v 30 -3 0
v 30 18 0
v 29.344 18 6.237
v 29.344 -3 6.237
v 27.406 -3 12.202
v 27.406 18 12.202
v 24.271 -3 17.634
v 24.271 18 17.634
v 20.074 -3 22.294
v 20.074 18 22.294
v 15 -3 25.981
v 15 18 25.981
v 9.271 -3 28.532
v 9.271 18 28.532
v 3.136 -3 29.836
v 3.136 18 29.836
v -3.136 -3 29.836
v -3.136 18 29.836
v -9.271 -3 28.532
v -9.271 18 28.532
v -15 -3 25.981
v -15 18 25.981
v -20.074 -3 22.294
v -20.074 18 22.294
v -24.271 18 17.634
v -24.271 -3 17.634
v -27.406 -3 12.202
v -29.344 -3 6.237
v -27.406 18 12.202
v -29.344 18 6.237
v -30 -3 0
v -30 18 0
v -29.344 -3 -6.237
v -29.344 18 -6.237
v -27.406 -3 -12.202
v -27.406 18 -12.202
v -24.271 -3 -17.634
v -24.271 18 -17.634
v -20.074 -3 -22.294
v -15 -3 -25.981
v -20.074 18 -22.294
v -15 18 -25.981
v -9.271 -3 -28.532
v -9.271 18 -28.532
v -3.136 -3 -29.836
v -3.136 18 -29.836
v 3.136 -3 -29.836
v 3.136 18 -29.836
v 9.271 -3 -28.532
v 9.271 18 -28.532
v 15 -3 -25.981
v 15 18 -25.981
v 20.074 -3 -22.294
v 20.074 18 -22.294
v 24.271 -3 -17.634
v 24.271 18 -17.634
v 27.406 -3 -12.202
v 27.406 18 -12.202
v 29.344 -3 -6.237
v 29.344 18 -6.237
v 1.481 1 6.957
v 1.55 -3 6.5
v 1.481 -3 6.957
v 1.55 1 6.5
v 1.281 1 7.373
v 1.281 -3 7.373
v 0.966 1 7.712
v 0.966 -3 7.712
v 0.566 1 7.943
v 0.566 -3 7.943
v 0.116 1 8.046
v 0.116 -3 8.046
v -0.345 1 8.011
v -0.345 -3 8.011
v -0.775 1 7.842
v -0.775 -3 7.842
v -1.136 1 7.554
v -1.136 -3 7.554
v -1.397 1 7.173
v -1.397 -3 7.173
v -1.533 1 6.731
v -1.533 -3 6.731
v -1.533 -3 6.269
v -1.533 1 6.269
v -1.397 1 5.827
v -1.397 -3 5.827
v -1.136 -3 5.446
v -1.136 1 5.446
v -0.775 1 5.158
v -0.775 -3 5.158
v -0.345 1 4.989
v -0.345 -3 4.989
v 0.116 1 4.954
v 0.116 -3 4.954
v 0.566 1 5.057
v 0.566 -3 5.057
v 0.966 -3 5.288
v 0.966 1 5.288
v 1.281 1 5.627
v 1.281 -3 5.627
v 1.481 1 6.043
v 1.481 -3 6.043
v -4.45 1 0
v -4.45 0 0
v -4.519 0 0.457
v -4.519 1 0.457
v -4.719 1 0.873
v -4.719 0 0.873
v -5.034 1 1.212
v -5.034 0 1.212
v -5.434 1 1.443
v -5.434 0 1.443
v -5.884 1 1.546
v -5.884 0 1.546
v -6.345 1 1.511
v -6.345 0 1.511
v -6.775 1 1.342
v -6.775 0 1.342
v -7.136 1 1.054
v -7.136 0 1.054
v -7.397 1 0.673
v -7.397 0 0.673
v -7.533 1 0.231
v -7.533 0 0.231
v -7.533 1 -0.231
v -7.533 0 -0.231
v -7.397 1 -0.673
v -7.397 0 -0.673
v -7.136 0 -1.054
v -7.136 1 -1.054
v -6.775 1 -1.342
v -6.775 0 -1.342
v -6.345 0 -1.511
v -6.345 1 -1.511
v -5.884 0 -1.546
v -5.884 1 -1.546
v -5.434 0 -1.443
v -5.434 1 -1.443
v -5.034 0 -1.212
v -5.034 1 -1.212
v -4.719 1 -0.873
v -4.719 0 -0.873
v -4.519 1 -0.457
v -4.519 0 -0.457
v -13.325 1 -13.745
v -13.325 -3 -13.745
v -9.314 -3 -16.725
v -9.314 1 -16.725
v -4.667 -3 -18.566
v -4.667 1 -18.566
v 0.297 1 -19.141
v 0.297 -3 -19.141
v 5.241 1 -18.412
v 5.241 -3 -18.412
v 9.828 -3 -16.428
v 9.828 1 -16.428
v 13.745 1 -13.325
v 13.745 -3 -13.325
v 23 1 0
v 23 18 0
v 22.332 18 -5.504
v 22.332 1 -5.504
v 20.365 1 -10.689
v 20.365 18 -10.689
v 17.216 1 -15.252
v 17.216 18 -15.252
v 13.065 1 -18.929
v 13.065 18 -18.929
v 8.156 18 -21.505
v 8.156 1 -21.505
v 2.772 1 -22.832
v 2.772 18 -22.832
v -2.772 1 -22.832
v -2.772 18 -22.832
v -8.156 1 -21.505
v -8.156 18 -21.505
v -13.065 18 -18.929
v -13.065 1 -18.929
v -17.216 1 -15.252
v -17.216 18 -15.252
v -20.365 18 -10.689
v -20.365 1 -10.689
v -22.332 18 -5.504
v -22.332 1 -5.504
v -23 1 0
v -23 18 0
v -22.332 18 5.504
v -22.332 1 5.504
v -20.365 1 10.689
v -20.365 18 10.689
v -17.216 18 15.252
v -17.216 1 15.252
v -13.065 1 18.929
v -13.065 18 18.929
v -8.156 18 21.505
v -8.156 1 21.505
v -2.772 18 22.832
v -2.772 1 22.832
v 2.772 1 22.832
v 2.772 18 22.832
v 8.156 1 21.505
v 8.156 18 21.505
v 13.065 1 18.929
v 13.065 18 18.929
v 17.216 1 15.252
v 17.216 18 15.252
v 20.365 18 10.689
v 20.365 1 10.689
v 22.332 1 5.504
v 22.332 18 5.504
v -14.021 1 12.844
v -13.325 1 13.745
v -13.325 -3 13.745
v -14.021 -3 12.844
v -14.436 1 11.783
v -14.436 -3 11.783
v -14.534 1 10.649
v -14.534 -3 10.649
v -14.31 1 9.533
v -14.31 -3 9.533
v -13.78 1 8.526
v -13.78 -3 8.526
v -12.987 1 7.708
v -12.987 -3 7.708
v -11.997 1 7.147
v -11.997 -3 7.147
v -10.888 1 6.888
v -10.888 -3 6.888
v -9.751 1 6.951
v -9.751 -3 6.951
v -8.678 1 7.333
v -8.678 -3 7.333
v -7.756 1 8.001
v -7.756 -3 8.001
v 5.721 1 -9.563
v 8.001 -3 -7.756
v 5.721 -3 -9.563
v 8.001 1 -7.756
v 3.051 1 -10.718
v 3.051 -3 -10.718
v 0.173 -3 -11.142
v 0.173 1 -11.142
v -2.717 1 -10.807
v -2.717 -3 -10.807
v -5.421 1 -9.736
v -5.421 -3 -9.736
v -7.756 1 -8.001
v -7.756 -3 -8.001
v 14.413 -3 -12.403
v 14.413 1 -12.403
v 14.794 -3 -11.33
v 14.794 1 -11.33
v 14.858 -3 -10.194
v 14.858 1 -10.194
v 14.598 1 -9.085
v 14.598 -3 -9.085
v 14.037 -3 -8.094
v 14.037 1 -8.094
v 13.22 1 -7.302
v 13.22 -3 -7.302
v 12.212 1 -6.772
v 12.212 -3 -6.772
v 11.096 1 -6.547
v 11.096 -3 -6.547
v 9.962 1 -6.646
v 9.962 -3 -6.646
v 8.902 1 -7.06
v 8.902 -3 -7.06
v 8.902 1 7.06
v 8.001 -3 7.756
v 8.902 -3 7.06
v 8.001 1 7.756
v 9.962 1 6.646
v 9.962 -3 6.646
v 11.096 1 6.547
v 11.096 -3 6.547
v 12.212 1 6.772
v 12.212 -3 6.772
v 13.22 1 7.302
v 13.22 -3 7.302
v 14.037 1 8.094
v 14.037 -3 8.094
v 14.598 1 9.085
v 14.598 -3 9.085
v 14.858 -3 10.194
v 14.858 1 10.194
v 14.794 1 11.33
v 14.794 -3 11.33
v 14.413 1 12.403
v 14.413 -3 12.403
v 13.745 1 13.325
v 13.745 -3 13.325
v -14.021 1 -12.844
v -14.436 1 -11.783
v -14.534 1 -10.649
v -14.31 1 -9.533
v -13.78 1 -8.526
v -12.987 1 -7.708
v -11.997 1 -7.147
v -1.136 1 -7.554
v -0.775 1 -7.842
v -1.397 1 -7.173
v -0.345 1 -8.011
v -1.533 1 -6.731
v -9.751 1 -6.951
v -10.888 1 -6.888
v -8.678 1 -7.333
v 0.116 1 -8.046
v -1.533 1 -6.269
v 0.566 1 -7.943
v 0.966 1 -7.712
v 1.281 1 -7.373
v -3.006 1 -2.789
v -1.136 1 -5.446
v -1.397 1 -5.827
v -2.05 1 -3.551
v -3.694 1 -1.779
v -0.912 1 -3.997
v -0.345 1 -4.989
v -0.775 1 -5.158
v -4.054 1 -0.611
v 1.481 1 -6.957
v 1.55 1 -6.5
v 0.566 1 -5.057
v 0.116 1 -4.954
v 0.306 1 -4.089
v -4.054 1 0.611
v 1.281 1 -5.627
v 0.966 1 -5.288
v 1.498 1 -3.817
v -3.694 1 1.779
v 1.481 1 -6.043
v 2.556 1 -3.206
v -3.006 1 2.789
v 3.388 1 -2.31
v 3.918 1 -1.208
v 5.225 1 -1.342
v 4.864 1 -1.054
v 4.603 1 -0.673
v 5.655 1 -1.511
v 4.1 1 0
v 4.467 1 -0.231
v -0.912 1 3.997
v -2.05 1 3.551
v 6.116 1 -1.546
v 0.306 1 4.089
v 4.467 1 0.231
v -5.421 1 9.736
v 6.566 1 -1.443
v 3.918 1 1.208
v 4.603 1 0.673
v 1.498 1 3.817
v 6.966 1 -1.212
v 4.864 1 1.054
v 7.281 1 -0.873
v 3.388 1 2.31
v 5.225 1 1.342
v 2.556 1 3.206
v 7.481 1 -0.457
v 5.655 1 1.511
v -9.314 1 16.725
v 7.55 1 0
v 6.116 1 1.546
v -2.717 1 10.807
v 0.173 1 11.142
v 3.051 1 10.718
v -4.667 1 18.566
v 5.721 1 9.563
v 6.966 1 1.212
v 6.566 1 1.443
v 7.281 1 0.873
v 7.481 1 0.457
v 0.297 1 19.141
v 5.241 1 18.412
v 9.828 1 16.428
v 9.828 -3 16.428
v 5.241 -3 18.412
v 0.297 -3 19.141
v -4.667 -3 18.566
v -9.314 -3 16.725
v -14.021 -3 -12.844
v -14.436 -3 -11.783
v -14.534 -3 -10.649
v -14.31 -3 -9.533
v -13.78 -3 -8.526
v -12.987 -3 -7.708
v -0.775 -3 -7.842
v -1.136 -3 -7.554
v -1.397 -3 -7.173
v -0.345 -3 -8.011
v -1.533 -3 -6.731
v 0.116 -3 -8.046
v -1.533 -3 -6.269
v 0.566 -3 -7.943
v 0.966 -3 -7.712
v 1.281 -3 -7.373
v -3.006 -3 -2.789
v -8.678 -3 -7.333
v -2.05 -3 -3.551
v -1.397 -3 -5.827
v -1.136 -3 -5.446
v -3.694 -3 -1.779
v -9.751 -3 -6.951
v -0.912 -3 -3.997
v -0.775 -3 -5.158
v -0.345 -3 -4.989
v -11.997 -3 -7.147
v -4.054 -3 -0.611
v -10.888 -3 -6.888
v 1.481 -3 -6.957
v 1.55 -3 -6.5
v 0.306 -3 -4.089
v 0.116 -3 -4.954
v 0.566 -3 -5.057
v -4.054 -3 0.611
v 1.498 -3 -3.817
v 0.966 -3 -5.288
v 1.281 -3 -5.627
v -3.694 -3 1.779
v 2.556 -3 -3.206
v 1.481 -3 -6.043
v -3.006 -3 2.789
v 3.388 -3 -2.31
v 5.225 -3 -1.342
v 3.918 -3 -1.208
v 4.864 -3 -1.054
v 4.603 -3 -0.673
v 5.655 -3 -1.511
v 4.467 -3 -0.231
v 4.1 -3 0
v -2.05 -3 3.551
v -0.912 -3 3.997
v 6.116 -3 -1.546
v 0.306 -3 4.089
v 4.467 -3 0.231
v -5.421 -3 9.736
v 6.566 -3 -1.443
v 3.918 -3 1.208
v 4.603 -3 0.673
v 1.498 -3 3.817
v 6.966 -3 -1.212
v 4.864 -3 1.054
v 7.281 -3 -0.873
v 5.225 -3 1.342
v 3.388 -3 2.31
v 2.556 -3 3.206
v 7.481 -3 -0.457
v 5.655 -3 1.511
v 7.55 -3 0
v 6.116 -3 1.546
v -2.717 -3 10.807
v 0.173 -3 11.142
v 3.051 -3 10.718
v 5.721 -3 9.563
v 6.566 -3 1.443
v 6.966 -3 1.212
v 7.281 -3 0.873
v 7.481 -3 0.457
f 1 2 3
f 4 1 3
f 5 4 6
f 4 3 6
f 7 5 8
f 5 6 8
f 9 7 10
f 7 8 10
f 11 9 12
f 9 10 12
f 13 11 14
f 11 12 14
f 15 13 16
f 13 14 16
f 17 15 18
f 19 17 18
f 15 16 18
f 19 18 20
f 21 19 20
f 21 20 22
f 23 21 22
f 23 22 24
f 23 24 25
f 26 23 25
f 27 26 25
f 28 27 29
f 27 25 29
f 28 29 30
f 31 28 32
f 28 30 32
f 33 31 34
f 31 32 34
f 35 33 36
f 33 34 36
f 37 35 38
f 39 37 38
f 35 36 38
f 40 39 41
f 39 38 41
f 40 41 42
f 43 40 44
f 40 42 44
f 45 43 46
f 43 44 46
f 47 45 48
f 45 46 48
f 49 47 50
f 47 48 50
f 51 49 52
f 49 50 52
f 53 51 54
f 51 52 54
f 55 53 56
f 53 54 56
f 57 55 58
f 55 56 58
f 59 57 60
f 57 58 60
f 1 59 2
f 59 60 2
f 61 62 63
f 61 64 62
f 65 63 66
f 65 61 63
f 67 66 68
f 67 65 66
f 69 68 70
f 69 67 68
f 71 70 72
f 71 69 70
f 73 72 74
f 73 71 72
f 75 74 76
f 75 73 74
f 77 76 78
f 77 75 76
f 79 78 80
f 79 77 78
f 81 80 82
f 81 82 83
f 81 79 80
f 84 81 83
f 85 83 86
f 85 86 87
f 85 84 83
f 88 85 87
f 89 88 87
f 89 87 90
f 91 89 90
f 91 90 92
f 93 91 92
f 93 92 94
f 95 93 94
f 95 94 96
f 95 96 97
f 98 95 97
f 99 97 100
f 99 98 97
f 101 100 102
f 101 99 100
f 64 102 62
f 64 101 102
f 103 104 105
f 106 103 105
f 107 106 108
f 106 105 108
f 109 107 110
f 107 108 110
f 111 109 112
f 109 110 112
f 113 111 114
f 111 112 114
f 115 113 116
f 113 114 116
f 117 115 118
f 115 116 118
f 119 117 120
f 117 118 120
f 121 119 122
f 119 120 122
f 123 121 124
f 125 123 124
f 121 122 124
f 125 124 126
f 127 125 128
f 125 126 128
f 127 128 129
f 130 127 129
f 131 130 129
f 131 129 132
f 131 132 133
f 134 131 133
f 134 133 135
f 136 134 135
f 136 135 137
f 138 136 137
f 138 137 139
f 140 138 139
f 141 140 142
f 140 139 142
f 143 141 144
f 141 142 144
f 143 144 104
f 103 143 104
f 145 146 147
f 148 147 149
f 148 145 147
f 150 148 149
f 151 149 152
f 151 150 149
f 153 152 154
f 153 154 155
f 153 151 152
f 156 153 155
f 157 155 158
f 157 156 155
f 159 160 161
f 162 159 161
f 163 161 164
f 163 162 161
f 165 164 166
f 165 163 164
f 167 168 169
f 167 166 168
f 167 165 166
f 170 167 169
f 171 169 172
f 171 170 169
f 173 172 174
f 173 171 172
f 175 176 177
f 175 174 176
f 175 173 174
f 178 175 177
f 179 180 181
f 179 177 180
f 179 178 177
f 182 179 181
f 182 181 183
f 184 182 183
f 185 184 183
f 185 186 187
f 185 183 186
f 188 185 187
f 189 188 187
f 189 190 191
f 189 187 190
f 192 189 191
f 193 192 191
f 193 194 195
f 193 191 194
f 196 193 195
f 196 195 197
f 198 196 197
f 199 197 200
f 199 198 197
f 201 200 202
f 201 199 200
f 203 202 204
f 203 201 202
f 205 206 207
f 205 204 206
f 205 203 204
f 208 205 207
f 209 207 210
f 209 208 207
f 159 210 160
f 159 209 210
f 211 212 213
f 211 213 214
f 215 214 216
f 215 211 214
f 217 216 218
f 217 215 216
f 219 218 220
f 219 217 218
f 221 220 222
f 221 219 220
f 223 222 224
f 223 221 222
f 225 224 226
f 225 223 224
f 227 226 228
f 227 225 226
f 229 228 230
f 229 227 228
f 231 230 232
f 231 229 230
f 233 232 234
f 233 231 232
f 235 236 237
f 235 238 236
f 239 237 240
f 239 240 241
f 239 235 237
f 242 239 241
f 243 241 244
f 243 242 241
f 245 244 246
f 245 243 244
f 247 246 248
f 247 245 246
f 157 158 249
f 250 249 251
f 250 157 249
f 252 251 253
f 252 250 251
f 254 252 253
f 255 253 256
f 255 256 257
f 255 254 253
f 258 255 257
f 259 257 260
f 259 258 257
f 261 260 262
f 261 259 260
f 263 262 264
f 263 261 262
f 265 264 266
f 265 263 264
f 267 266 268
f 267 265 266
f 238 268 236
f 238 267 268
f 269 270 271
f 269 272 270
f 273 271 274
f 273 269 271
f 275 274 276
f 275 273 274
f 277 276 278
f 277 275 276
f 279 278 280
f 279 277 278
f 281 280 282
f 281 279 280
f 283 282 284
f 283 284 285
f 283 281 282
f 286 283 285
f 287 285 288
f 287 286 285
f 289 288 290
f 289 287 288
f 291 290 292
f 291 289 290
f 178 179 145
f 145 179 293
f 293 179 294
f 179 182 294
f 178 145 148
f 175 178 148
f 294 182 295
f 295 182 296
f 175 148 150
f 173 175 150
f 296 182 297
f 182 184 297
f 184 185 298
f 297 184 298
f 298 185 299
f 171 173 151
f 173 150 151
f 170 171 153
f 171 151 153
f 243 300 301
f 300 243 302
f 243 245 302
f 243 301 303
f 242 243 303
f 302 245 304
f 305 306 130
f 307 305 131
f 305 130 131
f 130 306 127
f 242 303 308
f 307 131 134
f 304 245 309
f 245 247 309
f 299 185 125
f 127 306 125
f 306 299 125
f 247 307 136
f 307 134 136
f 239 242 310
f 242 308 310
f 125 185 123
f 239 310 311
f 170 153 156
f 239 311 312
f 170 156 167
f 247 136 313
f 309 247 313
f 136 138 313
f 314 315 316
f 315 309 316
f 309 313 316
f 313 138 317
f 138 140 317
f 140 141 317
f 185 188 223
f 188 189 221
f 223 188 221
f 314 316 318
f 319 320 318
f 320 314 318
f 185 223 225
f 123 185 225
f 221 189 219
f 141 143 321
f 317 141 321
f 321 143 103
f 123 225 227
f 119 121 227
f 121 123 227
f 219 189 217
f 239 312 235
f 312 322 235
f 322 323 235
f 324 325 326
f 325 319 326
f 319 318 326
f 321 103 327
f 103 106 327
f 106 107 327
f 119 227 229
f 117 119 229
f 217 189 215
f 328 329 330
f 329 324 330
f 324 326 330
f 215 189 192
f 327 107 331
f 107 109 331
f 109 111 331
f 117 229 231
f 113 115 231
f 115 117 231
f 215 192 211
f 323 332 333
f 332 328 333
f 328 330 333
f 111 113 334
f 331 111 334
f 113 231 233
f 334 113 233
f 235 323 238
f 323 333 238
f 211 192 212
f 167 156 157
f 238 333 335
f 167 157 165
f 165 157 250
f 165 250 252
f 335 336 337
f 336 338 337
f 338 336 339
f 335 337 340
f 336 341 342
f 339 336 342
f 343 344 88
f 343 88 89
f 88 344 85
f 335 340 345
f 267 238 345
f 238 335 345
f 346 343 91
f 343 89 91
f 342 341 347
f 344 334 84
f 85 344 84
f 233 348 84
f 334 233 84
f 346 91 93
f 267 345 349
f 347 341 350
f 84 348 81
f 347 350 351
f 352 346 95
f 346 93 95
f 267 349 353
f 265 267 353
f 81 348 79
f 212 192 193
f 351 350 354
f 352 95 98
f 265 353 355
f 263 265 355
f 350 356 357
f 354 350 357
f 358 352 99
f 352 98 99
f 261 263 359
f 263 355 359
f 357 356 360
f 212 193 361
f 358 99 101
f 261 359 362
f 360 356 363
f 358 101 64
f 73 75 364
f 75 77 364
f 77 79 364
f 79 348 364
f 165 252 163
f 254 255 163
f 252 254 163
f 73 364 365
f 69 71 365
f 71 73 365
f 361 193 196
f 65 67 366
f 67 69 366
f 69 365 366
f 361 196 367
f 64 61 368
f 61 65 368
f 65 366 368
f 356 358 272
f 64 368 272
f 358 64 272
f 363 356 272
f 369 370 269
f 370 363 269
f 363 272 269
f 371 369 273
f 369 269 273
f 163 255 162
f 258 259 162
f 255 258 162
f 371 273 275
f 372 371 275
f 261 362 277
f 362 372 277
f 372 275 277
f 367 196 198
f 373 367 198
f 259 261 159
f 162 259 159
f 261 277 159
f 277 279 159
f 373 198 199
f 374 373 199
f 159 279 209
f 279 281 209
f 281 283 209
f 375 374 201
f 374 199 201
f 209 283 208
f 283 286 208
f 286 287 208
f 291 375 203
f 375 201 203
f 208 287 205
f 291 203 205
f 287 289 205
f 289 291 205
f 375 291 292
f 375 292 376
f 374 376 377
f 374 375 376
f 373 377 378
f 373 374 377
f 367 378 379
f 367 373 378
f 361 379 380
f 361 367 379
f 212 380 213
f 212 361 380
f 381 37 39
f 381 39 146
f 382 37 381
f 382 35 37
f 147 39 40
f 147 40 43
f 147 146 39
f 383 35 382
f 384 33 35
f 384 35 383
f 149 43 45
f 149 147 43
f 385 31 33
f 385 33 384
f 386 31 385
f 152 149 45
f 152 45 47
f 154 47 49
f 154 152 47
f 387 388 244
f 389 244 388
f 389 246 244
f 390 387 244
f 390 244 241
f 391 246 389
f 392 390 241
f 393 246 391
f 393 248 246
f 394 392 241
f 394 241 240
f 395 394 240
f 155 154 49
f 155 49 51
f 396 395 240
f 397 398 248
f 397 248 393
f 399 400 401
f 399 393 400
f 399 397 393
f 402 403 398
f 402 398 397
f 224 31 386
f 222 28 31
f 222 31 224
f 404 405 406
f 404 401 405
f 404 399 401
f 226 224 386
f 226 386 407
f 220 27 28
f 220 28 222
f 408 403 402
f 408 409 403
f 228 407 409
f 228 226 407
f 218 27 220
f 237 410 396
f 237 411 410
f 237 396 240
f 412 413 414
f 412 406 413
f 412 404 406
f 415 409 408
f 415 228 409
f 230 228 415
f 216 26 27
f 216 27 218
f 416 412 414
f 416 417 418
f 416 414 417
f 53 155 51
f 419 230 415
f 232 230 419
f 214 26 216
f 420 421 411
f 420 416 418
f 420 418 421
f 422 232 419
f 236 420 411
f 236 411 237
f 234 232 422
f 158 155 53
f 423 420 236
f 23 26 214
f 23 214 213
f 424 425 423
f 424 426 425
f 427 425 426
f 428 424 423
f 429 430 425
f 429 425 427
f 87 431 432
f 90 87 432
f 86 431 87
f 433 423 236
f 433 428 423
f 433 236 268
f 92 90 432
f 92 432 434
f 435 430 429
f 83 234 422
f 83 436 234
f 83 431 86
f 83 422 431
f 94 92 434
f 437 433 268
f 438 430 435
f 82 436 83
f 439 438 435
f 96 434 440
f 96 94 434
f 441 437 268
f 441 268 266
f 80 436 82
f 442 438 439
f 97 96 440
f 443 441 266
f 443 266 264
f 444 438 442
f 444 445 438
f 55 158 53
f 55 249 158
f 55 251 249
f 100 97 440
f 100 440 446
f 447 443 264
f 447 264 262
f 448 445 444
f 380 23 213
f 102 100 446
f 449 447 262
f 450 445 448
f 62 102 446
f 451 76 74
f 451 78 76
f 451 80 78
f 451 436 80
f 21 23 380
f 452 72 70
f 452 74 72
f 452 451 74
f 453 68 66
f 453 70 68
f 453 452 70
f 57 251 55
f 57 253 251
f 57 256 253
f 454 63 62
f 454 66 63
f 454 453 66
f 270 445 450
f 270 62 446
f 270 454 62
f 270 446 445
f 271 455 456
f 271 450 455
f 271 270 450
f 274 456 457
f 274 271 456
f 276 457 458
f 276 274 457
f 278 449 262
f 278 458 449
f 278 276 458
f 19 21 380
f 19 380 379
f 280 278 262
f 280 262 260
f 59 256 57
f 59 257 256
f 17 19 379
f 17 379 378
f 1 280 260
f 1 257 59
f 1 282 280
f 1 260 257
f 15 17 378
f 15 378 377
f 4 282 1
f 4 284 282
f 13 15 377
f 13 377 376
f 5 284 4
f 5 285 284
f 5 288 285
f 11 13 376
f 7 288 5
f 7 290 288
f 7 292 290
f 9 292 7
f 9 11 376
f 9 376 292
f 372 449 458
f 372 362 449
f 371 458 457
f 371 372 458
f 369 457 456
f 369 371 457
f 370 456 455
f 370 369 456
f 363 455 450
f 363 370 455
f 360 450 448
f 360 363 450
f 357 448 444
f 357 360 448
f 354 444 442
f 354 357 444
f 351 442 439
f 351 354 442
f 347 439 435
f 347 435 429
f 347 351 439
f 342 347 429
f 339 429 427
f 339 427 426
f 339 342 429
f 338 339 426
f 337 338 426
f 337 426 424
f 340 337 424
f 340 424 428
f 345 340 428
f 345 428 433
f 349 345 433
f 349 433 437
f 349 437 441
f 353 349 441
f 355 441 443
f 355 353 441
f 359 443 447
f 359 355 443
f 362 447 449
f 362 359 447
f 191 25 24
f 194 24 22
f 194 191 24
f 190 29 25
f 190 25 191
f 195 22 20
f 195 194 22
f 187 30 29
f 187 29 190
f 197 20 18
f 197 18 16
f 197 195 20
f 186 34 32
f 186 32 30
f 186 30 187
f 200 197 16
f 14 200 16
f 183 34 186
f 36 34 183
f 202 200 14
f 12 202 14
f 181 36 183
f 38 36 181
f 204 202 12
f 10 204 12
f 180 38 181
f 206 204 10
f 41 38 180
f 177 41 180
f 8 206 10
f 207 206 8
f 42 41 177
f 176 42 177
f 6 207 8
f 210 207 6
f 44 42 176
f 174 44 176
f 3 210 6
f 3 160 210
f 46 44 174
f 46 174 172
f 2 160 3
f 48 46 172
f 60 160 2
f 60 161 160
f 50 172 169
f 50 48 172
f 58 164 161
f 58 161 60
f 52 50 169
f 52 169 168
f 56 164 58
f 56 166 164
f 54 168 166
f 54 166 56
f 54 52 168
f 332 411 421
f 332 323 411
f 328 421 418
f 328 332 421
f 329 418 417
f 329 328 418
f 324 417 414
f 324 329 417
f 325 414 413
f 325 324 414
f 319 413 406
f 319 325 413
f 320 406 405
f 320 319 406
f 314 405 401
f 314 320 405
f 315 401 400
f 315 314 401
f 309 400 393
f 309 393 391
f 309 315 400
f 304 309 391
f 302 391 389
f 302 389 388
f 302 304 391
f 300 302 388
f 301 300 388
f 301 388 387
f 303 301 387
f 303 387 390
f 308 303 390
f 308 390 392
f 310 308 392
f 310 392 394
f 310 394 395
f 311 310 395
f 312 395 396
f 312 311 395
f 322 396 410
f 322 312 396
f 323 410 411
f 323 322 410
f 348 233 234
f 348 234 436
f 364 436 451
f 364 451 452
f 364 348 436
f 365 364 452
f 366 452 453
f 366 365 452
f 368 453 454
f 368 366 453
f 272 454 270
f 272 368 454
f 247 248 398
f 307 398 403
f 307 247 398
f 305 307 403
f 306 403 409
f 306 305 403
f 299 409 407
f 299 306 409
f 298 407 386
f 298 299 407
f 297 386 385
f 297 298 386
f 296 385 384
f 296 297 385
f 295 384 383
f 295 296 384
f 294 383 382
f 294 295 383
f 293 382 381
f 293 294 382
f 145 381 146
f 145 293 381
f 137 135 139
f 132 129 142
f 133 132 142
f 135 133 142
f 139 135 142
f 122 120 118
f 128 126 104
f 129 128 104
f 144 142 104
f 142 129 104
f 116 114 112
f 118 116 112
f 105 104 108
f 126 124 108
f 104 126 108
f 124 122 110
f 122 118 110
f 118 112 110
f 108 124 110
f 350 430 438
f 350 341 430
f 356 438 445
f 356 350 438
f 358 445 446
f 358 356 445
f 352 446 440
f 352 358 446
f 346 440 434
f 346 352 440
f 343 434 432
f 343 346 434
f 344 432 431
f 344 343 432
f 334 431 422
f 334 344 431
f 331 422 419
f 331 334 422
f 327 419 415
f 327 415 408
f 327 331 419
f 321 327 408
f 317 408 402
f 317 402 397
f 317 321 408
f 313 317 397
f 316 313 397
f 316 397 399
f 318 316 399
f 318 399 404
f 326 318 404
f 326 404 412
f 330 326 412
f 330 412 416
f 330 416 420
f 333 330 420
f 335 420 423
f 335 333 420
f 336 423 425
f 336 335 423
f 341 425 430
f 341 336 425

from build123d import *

# Parameters (mm, degrees)
SKETCH_1_R          = 30
SKETCH_1_R_2        = 23
EXTRUDE_1_DEPTH     = 21
SKETCH_2_R          = 23
SKETCH_2_R_2        = 4.1
SKETCH_2_R_3        = 1.55
EXTRUDE_2_DEPTH     = 1
SKETCH_3_R          = 30
SKETCH_3_R_2        = 1.55
SKETCH_3_R_3        = 4.1
EXTRUDE_3_DEPTH     = 3
SKETCH_4_R          = 30
CUT_EXTRUDE_1_DEPTH = 3


with BuildPart() as part:
    # 草图1 → 凸台-拉伸1 (new body)
    with BuildSketch(Plane(origin=(0, 0, 0), x_dir=(1, 0, 0), z_dir=(0, 1, 0))):
        Circle(SKETCH_1_R)
        Circle(SKETCH_1_R_2, mode=Mode.SUBTRACT)
    extrude(amount=EXTRUDE_1_DEPTH)

    # 草图2 → 凸台-拉伸2 (add)
    with BuildSketch(Plane.XZ):
        Circle(SKETCH_2_R)
        Circle(SKETCH_2_R_2, mode=Mode.SUBTRACT)
        with Locations((6, 0)):
            Circle(SKETCH_2_R_3, mode=Mode.SUBTRACT)
        with Locations((-6, 0)):
            Circle(SKETCH_2_R_3, mode=Mode.SUBTRACT)
        with Locations((0, 6.5)):
            Circle(SKETCH_2_R_3, mode=Mode.SUBTRACT)
        with Locations((0, -6.5)):
            Circle(SKETCH_2_R_3, mode=Mode.SUBTRACT)
        with BuildLine():
            ThreePointArc((13.744660155, 13.324975875), (0.2967616, 19.141123201), (-13.324975875, 13.744660155))
            ThreePointArc((-13.324975875, 13.744660155), (-13.412668503, 8.088485652), (-7.756494001, 8.000793024))
            ThreePointArc((-7.756494001, 8.000793024), (0.172745496, 11.142084508), (8.000793024, 7.756494001))
            ThreePointArc((8.000793024, 7.756494001), (13.656967527, 7.668801373), (13.744660155, 13.324975875))
        make_face(mode=Mode.SUBTRACT)
        with BuildLine():
            ThreePointArc((13.744660155, -13.324975875), (0.2967616, -19.141123201), (-13.324975875, -13.744660155))
            ThreePointArc((-13.324975875, -13.744660155), (-13.412668503, -8.088485652), (-7.756494001, -8.000793024))
            ThreePointArc((-7.756494001, -8.000793024), (0.172745496, -11.142084508), (8.000793024, -7.756494001))
            ThreePointArc((8.000793024, -7.756494001), (13.656967527, -7.668801373), (13.744660155, -13.324975875))
        make_face(mode=Mode.SUBTRACT)
    extrude(amount=-EXTRUDE_2_DEPTH)

    # 草图3 → 凸台-拉伸3 (add)
    with BuildSketch(Plane.XZ):
        Circle(SKETCH_3_R)
        with Locations((0, -6.5)):
            Circle(SKETCH_3_R_2, mode=Mode.SUBTRACT)
        with Locations((6, 0)):
            Circle(SKETCH_3_R_2, mode=Mode.SUBTRACT)
        Circle(SKETCH_3_R_3, mode=Mode.SUBTRACT)
        with Locations((0, 6.5)):
            Circle(SKETCH_3_R_2, mode=Mode.SUBTRACT)
        with BuildLine():
            ThreePointArc((-7.756494001, -8.000793024), (-13.412668503, -8.088485652), (-13.324975875, -13.744660155))
            ThreePointArc((-13.324975875, -13.744660155), (0.2967616, -19.141123201), (13.744660155, -13.324975875))
            ThreePointArc((13.744660155, -13.324975875), (13.656967527, -7.668801373), (8.000793024, -7.756494001))
            ThreePointArc((8.000793024, -7.756494001), (0.172745496, -11.142084508), (-7.756494001, -8.000793024))
        make_face(mode=Mode.SUBTRACT)
        with BuildLine():
            ThreePointArc((8.000793024, 7.756494001), (13.656967527, 7.668801373), (13.744660155, 13.324975875))
            ThreePointArc((13.744660155, 13.324975875), (0.2967616, 19.141123201), (-13.324975875, 13.744660155))
            ThreePointArc((-13.324975875, 13.744660155), (-13.412668503, 8.088485652), (-7.756494001, 8.000793024))
            ThreePointArc((-7.756494001, 8.000793024), (0.172745496, 11.142084508), (8.000793024, 7.756494001))
        make_face(mode=Mode.SUBTRACT)
    extrude(amount=EXTRUDE_3_DEPTH)

    # 草图4 → 切除-拉伸1 (cut)
    with BuildSketch(Plane(origin=(0, 21, 0), x_dir=(1, 0, 0), z_dir=(0, 1, 0))):
        Circle(SKETCH_4_R)
    extrude(amount=-CUT_EXTRUDE_1_DEPTH, mode=Mode.SUBTRACT)


solid = part.part
